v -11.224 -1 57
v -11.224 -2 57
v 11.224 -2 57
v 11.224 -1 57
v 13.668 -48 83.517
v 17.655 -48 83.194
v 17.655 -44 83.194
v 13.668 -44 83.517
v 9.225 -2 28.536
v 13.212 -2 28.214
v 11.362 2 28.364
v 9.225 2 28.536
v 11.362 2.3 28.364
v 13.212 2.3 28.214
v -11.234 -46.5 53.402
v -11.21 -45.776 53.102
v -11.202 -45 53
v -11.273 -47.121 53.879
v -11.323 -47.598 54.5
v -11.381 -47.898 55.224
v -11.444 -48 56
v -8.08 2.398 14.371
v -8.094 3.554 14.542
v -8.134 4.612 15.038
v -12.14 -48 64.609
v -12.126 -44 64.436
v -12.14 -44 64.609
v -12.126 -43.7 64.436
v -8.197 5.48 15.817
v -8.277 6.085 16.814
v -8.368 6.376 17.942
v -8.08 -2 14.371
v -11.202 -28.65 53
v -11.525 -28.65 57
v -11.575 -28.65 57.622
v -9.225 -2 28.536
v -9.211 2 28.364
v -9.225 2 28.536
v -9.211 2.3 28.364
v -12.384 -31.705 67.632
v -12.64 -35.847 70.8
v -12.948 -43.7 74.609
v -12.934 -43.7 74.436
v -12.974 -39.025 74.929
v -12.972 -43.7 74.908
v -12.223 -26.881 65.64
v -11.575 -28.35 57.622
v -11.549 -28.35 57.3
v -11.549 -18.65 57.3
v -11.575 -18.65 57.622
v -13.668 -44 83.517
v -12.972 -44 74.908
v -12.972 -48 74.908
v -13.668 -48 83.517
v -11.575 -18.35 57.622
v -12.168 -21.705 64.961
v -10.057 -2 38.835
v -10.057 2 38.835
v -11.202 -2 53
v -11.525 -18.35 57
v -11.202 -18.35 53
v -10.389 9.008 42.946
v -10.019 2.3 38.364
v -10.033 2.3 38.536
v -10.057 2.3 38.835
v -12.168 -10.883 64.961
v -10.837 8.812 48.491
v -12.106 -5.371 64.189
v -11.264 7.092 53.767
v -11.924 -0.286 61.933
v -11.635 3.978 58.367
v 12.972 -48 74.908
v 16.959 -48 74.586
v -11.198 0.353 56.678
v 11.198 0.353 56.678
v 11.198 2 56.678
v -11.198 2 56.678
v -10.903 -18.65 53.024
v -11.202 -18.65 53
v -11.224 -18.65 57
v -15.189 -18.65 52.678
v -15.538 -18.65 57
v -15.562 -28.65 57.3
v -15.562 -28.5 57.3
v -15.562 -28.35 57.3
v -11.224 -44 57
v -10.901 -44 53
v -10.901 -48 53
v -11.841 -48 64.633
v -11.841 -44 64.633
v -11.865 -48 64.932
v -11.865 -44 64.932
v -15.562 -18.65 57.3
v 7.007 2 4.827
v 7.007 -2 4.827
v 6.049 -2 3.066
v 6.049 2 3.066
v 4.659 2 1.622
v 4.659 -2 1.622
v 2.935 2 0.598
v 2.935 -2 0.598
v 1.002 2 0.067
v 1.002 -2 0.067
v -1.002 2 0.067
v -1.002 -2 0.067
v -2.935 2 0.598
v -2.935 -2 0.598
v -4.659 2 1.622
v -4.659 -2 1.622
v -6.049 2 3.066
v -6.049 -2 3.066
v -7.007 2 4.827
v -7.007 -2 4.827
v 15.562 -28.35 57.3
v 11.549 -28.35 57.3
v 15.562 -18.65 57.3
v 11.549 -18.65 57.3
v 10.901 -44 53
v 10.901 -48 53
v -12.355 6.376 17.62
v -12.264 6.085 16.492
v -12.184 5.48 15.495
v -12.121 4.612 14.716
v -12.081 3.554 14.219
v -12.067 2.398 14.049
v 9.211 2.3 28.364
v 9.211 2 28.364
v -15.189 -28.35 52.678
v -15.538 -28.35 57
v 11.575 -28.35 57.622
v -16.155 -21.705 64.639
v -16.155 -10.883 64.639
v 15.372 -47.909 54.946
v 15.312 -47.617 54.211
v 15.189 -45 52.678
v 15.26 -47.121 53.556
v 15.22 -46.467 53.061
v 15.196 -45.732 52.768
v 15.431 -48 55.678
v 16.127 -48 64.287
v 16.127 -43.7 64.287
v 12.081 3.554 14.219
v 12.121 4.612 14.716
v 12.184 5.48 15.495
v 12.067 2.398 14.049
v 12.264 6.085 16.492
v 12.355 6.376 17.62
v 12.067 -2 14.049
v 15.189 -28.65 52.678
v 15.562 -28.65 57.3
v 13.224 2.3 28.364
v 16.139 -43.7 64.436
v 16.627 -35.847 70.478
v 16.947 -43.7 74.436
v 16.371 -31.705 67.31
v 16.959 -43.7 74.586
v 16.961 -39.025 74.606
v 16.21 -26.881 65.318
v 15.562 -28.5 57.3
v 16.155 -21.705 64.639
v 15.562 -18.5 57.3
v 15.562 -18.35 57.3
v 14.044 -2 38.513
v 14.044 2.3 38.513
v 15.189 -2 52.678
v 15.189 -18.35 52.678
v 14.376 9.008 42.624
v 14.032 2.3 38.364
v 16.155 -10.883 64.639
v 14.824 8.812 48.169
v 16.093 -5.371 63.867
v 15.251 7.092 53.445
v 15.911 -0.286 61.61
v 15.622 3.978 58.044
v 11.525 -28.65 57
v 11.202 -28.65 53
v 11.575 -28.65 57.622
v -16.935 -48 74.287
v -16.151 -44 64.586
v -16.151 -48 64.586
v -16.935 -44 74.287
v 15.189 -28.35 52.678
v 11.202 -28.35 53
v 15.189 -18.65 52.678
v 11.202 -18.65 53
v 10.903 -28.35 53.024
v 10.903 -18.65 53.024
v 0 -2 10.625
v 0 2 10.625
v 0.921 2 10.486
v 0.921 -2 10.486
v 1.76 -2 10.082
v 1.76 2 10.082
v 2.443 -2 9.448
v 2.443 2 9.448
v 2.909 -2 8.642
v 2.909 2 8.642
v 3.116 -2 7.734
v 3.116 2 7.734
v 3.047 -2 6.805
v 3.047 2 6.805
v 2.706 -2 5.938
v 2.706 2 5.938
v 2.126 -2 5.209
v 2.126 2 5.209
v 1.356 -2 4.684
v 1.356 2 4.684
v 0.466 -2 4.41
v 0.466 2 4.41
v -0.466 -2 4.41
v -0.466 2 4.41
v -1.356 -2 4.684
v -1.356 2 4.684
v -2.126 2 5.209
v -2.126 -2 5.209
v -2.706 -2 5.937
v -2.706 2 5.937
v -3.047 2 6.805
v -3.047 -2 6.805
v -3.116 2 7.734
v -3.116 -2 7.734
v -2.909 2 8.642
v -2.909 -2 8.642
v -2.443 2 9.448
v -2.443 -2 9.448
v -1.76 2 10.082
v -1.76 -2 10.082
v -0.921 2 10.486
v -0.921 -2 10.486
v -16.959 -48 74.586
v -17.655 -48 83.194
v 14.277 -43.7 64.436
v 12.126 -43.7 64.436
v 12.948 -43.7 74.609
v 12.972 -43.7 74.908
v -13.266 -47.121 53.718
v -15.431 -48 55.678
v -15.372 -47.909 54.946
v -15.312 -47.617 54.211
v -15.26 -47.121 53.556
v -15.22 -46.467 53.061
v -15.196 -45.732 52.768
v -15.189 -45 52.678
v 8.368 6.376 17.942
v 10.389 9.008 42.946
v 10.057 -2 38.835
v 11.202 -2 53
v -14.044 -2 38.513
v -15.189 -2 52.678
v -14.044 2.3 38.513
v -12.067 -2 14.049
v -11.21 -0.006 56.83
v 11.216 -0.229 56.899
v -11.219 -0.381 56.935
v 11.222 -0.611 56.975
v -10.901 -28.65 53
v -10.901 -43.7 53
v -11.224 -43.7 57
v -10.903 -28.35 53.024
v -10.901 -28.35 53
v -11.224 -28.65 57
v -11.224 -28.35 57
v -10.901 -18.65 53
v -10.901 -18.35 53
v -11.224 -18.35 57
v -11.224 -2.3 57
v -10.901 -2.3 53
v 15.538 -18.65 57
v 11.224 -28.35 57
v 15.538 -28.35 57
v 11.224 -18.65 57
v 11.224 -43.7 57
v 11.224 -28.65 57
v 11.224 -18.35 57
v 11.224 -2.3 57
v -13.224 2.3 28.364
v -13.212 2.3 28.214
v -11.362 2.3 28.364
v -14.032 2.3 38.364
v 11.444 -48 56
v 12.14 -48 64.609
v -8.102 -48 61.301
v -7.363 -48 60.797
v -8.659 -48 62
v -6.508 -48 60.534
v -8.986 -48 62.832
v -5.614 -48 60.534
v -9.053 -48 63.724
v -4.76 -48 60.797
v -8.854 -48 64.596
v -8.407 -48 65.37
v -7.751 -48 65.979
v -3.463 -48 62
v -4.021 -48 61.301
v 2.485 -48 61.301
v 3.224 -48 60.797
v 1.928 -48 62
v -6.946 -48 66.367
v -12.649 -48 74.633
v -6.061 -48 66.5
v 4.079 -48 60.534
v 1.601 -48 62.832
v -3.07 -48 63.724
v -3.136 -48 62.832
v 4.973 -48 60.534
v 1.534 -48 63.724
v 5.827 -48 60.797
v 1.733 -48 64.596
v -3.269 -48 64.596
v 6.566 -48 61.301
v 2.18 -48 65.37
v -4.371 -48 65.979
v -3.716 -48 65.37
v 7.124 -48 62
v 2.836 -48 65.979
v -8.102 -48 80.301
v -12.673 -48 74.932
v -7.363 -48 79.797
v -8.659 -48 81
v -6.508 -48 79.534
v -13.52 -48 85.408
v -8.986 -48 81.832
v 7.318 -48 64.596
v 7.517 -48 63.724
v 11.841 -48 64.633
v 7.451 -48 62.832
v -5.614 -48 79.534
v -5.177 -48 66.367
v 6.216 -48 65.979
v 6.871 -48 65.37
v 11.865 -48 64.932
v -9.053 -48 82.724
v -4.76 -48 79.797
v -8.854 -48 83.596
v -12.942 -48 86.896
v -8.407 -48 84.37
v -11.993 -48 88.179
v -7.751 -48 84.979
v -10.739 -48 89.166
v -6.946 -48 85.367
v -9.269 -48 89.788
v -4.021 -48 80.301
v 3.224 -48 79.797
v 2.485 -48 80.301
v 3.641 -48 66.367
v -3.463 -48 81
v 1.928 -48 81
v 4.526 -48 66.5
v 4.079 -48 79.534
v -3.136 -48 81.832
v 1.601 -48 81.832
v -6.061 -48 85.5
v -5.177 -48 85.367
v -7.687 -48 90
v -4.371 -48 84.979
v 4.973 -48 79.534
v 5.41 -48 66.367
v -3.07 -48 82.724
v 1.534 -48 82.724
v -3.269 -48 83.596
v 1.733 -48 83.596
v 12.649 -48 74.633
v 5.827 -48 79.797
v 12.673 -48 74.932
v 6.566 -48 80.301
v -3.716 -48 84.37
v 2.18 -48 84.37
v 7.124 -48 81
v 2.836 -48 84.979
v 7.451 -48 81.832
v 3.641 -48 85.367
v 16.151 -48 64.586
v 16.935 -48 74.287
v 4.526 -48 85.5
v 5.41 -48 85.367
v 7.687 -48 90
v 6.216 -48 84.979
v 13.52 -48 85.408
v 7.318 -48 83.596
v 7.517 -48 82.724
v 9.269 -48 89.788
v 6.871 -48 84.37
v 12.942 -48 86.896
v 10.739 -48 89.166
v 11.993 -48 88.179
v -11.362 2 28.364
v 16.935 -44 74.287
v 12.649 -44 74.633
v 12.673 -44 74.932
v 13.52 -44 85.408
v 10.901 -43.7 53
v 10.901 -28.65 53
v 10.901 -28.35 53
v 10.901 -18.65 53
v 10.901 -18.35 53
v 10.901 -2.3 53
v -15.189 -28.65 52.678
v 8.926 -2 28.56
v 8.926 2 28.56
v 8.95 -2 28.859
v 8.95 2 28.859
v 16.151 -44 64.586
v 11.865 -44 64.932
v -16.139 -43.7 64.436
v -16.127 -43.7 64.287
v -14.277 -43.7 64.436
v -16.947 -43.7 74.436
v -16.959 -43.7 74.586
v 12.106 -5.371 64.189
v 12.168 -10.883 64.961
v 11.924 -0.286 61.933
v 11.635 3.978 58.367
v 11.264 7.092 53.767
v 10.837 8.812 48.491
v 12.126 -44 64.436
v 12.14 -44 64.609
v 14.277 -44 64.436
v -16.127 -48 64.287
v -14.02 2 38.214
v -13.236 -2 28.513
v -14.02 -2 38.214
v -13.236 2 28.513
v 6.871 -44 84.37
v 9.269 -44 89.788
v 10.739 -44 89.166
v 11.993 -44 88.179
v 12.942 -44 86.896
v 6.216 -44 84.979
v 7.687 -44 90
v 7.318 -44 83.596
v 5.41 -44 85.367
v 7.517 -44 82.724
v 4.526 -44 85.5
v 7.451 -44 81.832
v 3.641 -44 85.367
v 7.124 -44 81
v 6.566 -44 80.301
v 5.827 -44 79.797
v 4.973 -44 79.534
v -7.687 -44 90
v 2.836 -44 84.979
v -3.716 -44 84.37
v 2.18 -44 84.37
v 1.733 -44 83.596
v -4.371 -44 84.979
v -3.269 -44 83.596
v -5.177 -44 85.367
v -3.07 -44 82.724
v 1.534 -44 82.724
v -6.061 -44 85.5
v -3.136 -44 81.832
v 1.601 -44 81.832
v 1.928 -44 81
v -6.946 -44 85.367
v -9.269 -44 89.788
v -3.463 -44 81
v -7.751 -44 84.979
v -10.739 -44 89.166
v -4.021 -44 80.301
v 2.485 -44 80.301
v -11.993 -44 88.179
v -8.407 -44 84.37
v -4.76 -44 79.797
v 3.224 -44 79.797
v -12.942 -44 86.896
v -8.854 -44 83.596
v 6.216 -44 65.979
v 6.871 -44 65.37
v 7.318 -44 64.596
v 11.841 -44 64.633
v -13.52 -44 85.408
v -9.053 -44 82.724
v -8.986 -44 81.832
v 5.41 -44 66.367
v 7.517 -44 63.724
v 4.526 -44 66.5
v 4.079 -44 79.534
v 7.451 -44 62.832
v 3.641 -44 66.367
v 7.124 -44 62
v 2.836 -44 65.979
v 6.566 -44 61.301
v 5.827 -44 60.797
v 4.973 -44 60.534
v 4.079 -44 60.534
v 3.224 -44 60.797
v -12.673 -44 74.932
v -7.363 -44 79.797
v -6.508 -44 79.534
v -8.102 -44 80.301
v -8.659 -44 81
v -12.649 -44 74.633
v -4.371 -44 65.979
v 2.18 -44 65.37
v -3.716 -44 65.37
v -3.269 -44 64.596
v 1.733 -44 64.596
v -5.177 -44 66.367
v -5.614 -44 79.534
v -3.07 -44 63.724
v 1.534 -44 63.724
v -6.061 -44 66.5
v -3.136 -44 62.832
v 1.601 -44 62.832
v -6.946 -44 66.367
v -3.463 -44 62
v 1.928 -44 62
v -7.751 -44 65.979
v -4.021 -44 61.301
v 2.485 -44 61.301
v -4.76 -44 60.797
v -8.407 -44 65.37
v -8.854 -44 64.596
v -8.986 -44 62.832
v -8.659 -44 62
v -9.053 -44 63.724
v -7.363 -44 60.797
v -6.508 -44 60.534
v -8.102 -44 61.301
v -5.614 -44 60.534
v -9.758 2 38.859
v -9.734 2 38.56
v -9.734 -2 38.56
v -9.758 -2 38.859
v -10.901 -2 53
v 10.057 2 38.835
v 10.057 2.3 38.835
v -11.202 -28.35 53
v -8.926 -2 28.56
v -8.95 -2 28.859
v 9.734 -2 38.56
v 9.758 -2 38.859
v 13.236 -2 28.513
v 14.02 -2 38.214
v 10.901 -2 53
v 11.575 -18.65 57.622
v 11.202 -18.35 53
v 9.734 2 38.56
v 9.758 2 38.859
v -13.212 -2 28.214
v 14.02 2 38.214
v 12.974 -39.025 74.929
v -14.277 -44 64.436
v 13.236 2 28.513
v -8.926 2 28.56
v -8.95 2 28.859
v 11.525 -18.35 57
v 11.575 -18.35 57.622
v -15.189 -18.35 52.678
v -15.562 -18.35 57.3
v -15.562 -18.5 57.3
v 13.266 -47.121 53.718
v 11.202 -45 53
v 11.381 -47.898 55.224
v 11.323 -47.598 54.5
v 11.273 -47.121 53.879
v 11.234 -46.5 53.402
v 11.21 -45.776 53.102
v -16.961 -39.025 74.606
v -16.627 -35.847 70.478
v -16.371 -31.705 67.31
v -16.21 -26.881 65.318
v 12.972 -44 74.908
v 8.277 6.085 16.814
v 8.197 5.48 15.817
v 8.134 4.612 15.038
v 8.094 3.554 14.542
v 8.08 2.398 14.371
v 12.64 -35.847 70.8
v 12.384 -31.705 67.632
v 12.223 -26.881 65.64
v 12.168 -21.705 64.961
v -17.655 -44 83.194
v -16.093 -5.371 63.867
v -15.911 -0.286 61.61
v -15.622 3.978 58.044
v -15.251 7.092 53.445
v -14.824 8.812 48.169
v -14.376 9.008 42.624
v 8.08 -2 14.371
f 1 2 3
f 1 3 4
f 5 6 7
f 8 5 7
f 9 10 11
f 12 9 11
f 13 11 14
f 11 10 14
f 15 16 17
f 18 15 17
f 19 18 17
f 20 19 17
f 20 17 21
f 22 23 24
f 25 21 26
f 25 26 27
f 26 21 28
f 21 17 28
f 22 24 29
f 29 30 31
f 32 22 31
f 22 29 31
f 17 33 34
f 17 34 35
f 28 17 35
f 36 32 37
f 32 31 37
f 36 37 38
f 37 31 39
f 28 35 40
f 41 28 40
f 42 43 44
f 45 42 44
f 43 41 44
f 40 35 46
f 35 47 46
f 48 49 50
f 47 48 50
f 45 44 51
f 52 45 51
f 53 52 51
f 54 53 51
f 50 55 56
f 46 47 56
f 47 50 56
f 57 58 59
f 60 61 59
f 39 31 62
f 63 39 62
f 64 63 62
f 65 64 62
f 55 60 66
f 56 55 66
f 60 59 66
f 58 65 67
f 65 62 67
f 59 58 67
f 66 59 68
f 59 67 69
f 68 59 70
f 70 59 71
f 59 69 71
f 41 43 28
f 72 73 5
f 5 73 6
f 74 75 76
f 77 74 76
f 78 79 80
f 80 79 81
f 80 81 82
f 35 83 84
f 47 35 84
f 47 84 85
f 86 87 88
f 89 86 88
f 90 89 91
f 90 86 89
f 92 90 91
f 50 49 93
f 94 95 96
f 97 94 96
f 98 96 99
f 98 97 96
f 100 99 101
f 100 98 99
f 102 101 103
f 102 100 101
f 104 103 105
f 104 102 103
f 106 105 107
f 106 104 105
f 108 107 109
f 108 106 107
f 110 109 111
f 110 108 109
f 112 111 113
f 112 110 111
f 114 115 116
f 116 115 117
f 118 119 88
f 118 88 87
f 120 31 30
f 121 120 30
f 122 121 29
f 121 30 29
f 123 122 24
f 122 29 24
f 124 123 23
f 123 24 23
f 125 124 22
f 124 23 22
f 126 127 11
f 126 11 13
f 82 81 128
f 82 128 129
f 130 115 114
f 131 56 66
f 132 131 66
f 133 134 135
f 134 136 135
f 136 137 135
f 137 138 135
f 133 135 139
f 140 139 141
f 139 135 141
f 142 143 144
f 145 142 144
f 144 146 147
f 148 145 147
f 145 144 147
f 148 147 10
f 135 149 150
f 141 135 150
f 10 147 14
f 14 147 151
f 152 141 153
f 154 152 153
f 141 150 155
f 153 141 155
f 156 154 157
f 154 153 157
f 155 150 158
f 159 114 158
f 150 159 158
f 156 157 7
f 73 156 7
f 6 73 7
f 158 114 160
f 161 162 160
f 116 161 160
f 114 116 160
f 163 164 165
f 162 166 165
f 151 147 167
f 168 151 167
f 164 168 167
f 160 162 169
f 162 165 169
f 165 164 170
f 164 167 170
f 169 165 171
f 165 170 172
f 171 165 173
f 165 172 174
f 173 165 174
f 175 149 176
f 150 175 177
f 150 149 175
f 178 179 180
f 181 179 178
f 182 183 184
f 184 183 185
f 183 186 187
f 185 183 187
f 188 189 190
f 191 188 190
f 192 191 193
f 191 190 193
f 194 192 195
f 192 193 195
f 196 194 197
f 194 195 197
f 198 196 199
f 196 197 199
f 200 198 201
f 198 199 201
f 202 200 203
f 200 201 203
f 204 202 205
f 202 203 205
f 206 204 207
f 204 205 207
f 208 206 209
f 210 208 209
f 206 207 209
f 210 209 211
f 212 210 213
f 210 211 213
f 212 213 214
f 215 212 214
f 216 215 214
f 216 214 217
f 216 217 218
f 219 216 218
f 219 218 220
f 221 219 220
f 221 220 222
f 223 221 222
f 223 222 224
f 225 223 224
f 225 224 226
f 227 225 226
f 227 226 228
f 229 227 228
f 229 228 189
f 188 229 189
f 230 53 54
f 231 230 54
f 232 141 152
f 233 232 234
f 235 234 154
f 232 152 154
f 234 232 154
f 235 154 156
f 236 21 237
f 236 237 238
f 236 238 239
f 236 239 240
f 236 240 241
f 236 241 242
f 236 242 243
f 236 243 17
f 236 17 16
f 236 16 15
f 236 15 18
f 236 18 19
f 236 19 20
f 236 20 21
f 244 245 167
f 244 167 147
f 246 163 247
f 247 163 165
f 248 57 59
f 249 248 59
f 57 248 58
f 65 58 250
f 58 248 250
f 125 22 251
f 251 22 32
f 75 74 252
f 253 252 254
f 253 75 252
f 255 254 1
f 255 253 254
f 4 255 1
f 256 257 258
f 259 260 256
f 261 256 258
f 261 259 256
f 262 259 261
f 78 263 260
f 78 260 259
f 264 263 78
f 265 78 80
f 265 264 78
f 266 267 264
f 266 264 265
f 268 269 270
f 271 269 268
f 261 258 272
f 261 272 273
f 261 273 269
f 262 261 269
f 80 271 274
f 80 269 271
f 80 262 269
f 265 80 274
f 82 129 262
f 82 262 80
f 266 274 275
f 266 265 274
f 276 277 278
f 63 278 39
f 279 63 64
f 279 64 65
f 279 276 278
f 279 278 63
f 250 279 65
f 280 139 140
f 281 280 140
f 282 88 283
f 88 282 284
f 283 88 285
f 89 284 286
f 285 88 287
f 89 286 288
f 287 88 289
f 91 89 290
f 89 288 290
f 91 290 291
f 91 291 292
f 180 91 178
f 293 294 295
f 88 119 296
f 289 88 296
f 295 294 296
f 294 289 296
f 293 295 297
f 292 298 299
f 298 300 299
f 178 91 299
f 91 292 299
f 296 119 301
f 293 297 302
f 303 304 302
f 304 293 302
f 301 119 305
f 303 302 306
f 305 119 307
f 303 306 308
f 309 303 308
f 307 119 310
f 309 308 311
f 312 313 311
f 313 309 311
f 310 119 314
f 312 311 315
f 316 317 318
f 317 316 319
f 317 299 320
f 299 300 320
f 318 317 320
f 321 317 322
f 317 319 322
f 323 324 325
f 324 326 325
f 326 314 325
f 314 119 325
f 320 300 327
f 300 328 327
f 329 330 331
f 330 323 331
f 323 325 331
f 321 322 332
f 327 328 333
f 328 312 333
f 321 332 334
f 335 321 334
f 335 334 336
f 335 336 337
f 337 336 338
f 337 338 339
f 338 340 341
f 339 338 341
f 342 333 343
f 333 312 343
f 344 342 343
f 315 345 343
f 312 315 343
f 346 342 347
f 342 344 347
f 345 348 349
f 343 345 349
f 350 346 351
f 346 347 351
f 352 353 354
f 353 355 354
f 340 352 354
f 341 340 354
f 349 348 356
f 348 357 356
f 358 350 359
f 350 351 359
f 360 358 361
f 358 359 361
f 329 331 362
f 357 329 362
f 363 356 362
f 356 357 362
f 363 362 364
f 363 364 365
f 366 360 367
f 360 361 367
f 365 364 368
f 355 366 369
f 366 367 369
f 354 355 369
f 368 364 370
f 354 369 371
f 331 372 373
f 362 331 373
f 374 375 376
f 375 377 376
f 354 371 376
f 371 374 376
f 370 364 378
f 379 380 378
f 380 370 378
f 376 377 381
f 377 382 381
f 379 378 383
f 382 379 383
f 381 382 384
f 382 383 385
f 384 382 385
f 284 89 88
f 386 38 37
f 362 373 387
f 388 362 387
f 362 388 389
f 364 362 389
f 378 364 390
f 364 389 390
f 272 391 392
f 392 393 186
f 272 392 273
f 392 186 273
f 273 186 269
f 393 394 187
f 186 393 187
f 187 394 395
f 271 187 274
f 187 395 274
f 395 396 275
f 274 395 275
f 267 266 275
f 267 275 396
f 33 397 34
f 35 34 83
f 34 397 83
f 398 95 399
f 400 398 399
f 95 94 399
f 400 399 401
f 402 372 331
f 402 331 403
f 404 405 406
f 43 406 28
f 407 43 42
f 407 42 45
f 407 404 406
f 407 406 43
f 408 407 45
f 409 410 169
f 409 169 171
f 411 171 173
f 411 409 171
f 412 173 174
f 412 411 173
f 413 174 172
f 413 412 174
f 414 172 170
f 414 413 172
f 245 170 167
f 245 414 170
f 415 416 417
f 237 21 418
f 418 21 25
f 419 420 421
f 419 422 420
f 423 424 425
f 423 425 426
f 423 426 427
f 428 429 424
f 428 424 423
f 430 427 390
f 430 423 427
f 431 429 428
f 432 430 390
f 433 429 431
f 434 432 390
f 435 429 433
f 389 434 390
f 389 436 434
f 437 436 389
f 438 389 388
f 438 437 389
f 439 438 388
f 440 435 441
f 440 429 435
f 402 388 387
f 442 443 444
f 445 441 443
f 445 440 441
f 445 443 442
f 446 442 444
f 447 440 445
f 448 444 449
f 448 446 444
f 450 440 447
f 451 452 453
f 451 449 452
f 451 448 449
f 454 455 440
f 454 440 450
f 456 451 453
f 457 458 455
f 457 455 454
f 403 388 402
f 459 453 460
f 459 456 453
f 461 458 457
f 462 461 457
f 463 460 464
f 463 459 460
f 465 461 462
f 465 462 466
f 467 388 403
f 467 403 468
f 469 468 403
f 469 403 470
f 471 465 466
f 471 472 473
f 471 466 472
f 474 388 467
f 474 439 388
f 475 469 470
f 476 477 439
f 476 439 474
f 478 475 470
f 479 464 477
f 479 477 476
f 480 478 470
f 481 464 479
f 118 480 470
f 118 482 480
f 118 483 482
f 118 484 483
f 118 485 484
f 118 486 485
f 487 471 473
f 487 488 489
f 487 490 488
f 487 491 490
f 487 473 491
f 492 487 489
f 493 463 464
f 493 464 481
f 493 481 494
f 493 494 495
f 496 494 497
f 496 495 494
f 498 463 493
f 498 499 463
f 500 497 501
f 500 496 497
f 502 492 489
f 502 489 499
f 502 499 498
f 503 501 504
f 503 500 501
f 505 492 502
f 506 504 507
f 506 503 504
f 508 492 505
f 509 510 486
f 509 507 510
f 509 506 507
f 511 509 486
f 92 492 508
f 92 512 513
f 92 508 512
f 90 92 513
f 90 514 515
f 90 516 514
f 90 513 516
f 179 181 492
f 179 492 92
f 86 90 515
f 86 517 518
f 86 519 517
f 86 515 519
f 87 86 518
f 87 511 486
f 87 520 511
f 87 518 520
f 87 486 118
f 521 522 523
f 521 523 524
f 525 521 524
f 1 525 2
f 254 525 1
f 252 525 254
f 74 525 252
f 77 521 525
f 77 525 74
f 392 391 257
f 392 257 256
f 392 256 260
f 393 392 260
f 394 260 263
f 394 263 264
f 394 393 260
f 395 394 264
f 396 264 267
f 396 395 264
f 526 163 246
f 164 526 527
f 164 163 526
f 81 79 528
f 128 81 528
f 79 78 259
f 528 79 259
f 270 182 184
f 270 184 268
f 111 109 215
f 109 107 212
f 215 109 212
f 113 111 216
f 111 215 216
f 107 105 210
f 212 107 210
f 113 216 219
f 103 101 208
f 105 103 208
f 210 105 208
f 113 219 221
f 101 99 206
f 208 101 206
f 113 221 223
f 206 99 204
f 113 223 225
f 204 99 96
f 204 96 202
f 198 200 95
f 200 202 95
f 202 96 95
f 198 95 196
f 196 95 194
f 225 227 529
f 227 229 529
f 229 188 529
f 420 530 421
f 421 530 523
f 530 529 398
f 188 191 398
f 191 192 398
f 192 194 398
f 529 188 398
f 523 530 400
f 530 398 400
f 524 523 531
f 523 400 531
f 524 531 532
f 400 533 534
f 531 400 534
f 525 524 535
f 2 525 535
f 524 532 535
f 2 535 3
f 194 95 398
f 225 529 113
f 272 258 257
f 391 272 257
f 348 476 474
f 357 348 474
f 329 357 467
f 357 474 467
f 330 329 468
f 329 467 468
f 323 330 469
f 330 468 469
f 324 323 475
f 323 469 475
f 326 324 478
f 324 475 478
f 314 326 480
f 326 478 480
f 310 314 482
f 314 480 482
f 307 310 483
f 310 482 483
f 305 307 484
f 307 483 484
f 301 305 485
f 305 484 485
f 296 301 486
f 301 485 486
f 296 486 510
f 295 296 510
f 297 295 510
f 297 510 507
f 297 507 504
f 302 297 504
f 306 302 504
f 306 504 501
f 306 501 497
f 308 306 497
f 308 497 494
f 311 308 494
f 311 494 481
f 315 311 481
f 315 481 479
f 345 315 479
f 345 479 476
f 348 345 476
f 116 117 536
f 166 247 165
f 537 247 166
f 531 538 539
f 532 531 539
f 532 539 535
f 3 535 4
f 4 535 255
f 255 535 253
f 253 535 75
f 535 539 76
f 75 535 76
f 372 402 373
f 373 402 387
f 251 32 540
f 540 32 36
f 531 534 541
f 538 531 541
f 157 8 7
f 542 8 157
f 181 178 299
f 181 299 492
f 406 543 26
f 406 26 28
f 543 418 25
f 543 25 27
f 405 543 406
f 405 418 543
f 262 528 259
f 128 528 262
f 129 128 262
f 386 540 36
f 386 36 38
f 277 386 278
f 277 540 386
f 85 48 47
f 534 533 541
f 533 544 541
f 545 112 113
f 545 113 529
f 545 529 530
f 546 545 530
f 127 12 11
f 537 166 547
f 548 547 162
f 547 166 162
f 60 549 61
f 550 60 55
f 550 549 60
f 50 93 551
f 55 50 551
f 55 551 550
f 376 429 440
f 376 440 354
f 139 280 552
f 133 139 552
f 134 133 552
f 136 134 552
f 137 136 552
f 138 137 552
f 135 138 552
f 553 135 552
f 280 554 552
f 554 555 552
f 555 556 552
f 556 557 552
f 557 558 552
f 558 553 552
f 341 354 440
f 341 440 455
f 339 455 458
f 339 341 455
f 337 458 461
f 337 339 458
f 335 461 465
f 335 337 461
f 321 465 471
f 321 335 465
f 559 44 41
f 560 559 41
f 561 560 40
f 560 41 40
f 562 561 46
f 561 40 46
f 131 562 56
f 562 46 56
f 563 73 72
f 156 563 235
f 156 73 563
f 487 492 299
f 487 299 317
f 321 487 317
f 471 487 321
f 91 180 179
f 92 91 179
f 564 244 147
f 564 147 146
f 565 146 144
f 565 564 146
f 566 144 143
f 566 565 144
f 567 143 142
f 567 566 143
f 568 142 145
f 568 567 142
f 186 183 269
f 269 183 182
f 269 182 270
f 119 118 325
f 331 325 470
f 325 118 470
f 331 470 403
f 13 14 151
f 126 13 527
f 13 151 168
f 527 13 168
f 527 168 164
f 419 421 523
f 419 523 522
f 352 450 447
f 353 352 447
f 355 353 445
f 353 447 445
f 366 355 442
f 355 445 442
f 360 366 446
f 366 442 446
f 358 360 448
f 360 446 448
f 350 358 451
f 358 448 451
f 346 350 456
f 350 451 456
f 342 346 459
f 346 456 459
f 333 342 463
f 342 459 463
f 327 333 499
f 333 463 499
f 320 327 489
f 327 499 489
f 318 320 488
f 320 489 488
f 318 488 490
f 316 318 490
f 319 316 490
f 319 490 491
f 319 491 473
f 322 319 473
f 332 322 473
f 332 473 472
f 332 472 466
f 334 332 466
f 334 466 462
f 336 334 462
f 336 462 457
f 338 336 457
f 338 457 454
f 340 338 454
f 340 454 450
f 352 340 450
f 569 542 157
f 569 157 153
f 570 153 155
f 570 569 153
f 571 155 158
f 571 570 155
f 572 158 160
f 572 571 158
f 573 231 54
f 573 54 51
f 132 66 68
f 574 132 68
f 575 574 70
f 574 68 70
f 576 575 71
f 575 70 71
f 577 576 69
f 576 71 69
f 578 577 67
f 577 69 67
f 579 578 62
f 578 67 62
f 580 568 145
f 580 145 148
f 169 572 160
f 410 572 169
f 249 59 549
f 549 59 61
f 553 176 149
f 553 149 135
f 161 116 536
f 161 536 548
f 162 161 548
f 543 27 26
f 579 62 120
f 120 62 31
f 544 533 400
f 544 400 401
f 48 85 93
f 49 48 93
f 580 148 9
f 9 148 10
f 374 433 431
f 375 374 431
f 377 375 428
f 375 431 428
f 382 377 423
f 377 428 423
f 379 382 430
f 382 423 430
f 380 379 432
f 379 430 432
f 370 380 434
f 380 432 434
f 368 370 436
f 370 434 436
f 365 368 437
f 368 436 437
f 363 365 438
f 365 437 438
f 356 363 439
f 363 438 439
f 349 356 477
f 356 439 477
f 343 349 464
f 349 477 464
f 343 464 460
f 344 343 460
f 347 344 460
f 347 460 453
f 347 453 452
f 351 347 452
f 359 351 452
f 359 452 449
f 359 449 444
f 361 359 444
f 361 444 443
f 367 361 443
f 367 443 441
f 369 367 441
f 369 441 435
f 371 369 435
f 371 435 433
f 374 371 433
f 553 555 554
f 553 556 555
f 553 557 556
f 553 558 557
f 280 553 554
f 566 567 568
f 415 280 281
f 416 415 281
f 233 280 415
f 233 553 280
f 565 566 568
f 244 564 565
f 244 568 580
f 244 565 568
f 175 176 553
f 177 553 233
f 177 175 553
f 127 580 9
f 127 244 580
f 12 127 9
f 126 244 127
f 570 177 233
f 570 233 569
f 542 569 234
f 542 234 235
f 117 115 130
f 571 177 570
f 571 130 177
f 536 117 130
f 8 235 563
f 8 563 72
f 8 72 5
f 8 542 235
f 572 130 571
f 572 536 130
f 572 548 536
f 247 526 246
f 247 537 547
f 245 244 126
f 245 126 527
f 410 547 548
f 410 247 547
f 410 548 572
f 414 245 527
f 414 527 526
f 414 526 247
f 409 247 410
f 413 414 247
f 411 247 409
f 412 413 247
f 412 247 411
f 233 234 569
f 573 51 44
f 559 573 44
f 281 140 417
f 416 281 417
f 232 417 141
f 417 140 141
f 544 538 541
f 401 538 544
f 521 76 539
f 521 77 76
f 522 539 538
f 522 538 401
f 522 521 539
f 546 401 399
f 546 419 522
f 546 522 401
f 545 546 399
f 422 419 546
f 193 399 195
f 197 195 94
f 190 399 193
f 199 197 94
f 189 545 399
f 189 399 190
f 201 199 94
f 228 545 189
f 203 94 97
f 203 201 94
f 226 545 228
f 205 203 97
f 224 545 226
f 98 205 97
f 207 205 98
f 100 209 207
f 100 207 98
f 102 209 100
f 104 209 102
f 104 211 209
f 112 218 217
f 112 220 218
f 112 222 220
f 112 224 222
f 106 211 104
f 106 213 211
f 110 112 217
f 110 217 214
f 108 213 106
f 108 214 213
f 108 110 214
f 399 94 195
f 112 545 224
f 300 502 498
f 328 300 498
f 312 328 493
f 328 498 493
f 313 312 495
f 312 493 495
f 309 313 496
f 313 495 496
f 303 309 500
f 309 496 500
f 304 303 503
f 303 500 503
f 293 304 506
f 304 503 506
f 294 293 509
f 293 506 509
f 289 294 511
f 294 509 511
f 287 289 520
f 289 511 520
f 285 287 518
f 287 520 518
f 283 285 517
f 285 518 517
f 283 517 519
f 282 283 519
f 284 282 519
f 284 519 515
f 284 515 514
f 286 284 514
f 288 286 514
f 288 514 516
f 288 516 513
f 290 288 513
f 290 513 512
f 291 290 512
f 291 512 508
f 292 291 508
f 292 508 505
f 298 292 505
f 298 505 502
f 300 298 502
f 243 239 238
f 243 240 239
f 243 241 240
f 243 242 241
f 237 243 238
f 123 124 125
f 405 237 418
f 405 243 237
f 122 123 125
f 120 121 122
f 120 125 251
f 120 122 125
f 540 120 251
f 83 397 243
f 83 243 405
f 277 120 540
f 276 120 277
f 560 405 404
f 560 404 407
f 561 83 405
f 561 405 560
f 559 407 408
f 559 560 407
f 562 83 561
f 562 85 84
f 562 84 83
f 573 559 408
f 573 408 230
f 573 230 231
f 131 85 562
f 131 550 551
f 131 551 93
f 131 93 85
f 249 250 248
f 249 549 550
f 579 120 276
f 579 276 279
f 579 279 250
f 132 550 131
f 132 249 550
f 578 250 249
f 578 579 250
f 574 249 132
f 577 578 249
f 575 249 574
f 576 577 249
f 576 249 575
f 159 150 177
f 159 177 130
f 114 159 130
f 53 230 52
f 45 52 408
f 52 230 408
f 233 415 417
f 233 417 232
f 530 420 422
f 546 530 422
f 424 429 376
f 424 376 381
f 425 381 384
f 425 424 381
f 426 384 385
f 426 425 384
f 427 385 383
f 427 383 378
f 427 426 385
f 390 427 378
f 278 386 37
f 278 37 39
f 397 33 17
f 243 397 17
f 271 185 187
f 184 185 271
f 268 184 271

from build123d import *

# Parameters (mm, degrees)
EXTRUDE_THIN1_DEPTH             = 15
SKETCH2_R                       = 3.125
SKETCH2_R_2                     = 3
CUT_EXTRUDE1_DEPTH              = 105.043260233
FILLET1_R                       = 6
BOSS_EXTRUDE1_DEPTH             = 4
CUT_EXTRUDE_THIN1_DEPTH         = 104.516638951
CUT_EXTRUDE_THIN1_DEPTH_BACK    = 104.516638951
SKETCH9_W                       = 10
SKETCH9_H                       = 0.3
SKETCH9_W_2                     = 0.3
SKETCH9_H_2                     = 10
SKETCH10_W                      = 0.3
SKETCH10_H                      = 6.641398284
SKETCH10_H_2                    = 6.68977618
SKETCH10_H_3                    = 6.232858904
SKETCH10_W_2                    = 7.476045761
SKETCH10_H_4                    = 0.3
SKETCH10_W_3                    = 11.836568253
SKETCH10_H_5                    = 6.233569927
CUT_EXTRUDE_THIN2_DEPTH         = 4.3
SKETCH11_R                      = 56.701195511
SKETCH11_W                      = 9.732603568
SKETCH11_H                      = 4
SKETCH11_W_2                    = 4.336308338
SKETCH11_H_2                    = 9.7
CUT_EXTRUDE2_DEPTH              = 0.3
BOSS_EXTRUDE2_REACH             = 105.517
SKETCH12_W                      = 4
SKETCH12_H                      = 4
BOSS_EXTRUDE2_DIRECTION_2_REACH = 105.517
CUT_EXTRUDE3_DEPTH              = 0.3
CUT_EXTRUDE4_DEPTH              = 0.3
CUT_EXTRUDE_THIN3_DEPTH         = 104.516638951
CUT_EXTRUDE_THIN3_DEPTH_BACK    = 104.516638951
SKETCH13_W                      = 26.058456106
SKETCH13_H                      = 0.3
SKETCH13_W_2                    = 36.049711327


with BuildPart() as part:
    # Sketch1 → Extrude-Thin1 (new, symmetric)
    with BuildSketch(Plane(origin=(0, 0, 0), x_dir=(0, 0, -1), z_dir=(1, 0, 0))):
        with BuildLine():
            Line((0, 2), (-54, 2))
            ThreePointArc((-54, 2), (-56.121320344, 1.121320344), (-57, -1))
            Line((-57, -1), (-57, -44))
            Line((-57, -44), (-90, -44))
            Line((-90, -44), (-90, -48))
            Line((-90, -48), (-56, -48))
            ThreePointArc((-56, -48), (-53.878679656, -47.121320344), (-53, -45))
            Line((-53, -45), (-53, -2))
            Line((-53, -2), (0, -2))
            Line((0, -2), (0, 2))
        make_face()
    extrude(amount=EXTRUDE_THIN1_DEPTH, both=True)

    # Sketch2 → Cut-Extrude1 (cut, through all)
    with BuildSketch(Plane(origin=(0, 2, 0), x_dir=(1, 0, 0), z_dir=(0, 1, 0))):
        with Locations(Location((0, -7.5, 0), (0, 0, 270))):
            Circle(SKETCH2_R)
        with Locations(Location((-6.061254587, -82.5, 0), (0, 0, 270))):
            Circle(SKETCH2_R_2)
        with Locations(Location((-6.061254587, -63.5, 0), (0, 0, 270))):
            Circle(SKETCH2_R_2)
        with Locations(Location((4.525736758, -82.5, 0), (0, 0, 270))):
            Circle(SKETCH2_R_2)
        with Locations(Location((4.525736758, -63.5, 0), (0, 0, 270))):
            Circle(SKETCH2_R_2)
        with BuildLine():
            Line((-7.475626789, -6.895844304), (-15, -100))
            Line((-15, -100), (-17.60021431, 8.448336275))
            Line((-17.60021431, 8.448336275), (38.426582869, 9.42947631))
            Line((38.426582869, 9.42947631), (15, -100))
            Line((15, -100), (7.475626789, -6.895844304))
            ThreePointArc((7.475626789, -6.895844304), (0, 0), (-7.475626789, -6.895844304))
        make_face()
    extrude(amount=-CUT_EXTRUDE1_DEPTH, mode=Mode.SUBTRACT)

    # Fillet1
    fillet1_edges = [part.edges().sort_by_distance(p)[0] for p in [
        (-14.191832722, -46, 90),
        (14.191832722, -46, 90),
    ]]
    fillet(fillet1_edges, radius=FILLET1_R)

    # Sketch8 → Boss-Extrude1 (add)
    with BuildSketch(Plane(origin=(6.873434456, 0, -0.555488482), x_dir=(-0.08055409274536145, 0, -0.9967502385963958), z_dir=(0.9967502385963958, 0, -0.08055409274536145))):
        with BuildLine():
            Line((-56.739879552, -48), (-84.346269175, -48))
            Line((-84.346269175, -48), (-84.346269175, -44))
            Line((-84.346269175, -44), (-75.730098482, -39.025451531))
            ThreePointArc((-75.730098482, -39.025451531), (-68.409590406, -31.704943455), (-65.730098482, -21.704943455))
            Line((-65.730098482, -21.704943455), (-65.730098482, -10.883213246))
            ThreePointArc((-65.730098482, -10.883213246), (-59.11411389, 3.978419624), (-43.643285327, 9.007619086))
            Line((-43.643285327, 9.007619086), (-18.558264158, 6.375866362))
            ThreePointArc((-18.558264158, 6.375866362), (-16.003300216, 5.074502978), (-14.975626789, 2.397699896))
            Line((-14.975626789, 2.397699896), (-14.975626789, 2))
            Line((-14.975626789, 2), (-14.975626789, -2))
            Line((-14.975626789, -2), (-53.730098482, -2))
            Line((-53.730098482, -2), (-53.730098482, -45))
            add(Edge.make_bspline(
                [(-56.739879552, -48), (-53.730098482, -48), (-53.730098482, -45)],
                knots=[4.71238898, 4.71238898, 4.71238898, 6.283185307, 6.283185307, 6.283185307], degree=2, weights=[1, 0.707106781, 1]))
        make_face()
    boss_extrude1 = extrude(amount=BOSS_EXTRUDE1_DEPTH)

    # Mirror1: Boss-Extrude1 across plane
    add(boss_extrude1.mirror(Plane(origin=(0, 0, 0), x_dir=(0, 0, 1), z_dir=(1, 0, 0))))

    # Sketch9 → Cut-Extrude-Thin1 (cut, two sides: drawn at the far end of the back side and taken through both)
    with BuildSketch(Plane(origin=(0, 0, 0), x_dir=(0, 0, -1), z_dir=(1, 0, 0)).offset(-CUT_EXTRUDE_THIN1_DEPTH_BACK)):
        with Locations((-33.363519176, 2.15)):
            Rectangle(SKETCH9_W, SKETCH9_H)
        with Locations((-57.15, -23.5)):
            Rectangle(SKETCH9_W_2, SKETCH9_H_2)
        with Locations((-69.436121351, -43.85)):
            Rectangle(SKETCH9_W, SKETCH9_H)
    extrude(amount=CUT_EXTRUDE_THIN1_DEPTH + CUT_EXTRUDE_THIN1_DEPTH_BACK, mode=Mode.SUBTRACT)

    # Sketch10 → Cut-Extrude-Thin2 (cut)
    with BuildSketch(Plane(origin=(-10.86043541, 0, -0.877704853), x_dir=(-0.08055409274536145, 0, 0.9967502385963957), z_dir=(-0.9967502385963957, 0, -0.08055409274536145))):
        with Locations((29.336560852, -1.020699142)):
            Rectangle(SKETCH10_W, SKETCH10_H)
        with Locations((39.36916442, -1.04488809)):
            Rectangle(SKETCH10_W, SKETCH10_H_2)
        with Locations((65.52677258, -46.816429452)):
            Rectangle(SKETCH10_W, SKETCH10_H_3)
        with Locations((54.629362047, -18.5)):
            Rectangle(SKETCH10_W_2, SKETCH10_H_4)
        with Locations((52.449100801, -28.5)):
            Rectangle(SKETCH10_W_3, SKETCH10_H_4)
        with Locations((75.559376148, -46.816784963)):
            Rectangle(SKETCH10_W, SKETCH10_H_5)
    cut_extrude_thin2 = extrude(amount=-CUT_EXTRUDE_THIN2_DEPTH, mode=Mode.SUBTRACT)

    # Sketch11 → Cut-Extrude2 (cut)
    with BuildSketch(Plane(origin=(-6.574409384, 0, -0.531322254), x_dir=(-0.08055409274536145, 0, 0.9967502385963957), z_dir=(-0.9967502385963957, 0, -0.08055409274536145))):
        with Locations((49.164522952, -12.48660382)):
            Circle(SKETCH11_R)
        with Locations((34.352862636, 0)):
            Rectangle(SKETCH11_W, SKETCH11_H, mode=Mode.SUBTRACT)
        with Locations((55.898252651, -23.5)):
            Rectangle(SKETCH11_W_2, SKETCH11_H_2, mode=Mode.SUBTRACT)
        with Locations((70.543074364, -46)):
            Rectangle(SKETCH11_W, SKETCH11_H, mode=Mode.SUBTRACT)
    cut_extrude2 = extrude(amount=CUT_EXTRUDE2_DEPTH, mode=Mode.SUBTRACT)

    # Mirror2: Cut-Extrude-Thin2 across plane
    add(cut_extrude_thin2.mirror(Plane(origin=(0, 0, 0), x_dir=(0, 0, 1), z_dir=(1, 0, 0))), mode=Mode.SUBTRACT)

    # Mirror3: Cut-Extrude2 across plane
    add(cut_extrude2.mirror(Plane(origin=(0, 0, 0), x_dir=(0, 0, 1), z_dir=(1, 0, 0))), mode=Mode.SUBTRACT)

    # Boss-Extrude2: up to this plane
    boss_extrude2_end = Plane(origin=(-6.574409384, 0, -0.531322254), z_dir=(0.9967502385963957, 0, 0.08055409274536145))
    # Sketch12 → Boss-Extrude2 (add, up to the surface)
    with BuildSketch(Plane(origin=(0, 0, 0), x_dir=(0, 0, -1), z_dir=(1, 0, 0)), mode=Mode.PRIVATE) as boss_extrude2_sk1:
        with Locations((-54.677783629, 0)):
            Rectangle(SKETCH12_W, SKETCH12_H)
    boss_extrude2_tool1 = split(extrude(boss_extrude2_sk1.sketch, amount=-BOSS_EXTRUDE2_REACH, mode=Mode.PRIVATE), bisect_by=boss_extrude2_end, keep=Keep.BOTH, mode=Mode.PRIVATE)
    add(boss_extrude2_tool1.solids().sort_by_distance((0, 0, 54.677784))[0])
    # Sketch12 → Boss-Extrude2 (add, up to the surface)
    with BuildSketch(Plane(origin=(0, 0, 0), x_dir=(0, 0, -1), z_dir=(1, 0, 0)), mode=Mode.PRIVATE) as boss_extrude2_sk2:
        with Locations((-55, -46)):
            Rectangle(SKETCH12_W, SKETCH12_H)
    boss_extrude2_tool2 = split(extrude(boss_extrude2_sk2.sketch, amount=-BOSS_EXTRUDE2_REACH, mode=Mode.PRIVATE), bisect_by=boss_extrude2_end, keep=Keep.BOTH, mode=Mode.PRIVATE)
    add(boss_extrude2_tool2.solids().sort_by_distance((0, -46, 55))[0])

    # Boss-Extrude2 direction 2: up to this plane
    boss_extrude2_direction_2_end = Plane(origin=(6.574409384, 0, -0.531322254), z_dir=(-0.9967502385963957, 0, 0.08055409274536145))
    # Sketch12 → Boss-Extrude2 direction 2 (add, up to the surface)
    with BuildSketch(Plane(origin=(0, 0, 0), x_dir=(0, 0, -1), z_dir=(1, 0, 0)), mode=Mode.PRIVATE) as boss_extrude2_direction_2_sk1:
        with Locations((-54.677783629, 0)):
            Rectangle(SKETCH12_W, SKETCH12_H)
    boss_extrude2_direction_2_tool1 = split(extrude(boss_extrude2_direction_2_sk1.sketch, amount=BOSS_EXTRUDE2_DIRECTION_2_REACH, mode=Mode.PRIVATE), bisect_by=boss_extrude2_direction_2_end, keep=Keep.BOTH, mode=Mode.PRIVATE)
    add(boss_extrude2_direction_2_tool1.solids().sort_by_distance((0, 0, 54.677784))[0])
    # Sketch12 → Boss-Extrude2 direction 2 (add, up to the surface)
    with BuildSketch(Plane(origin=(0, 0, 0), x_dir=(0, 0, -1), z_dir=(1, 0, 0)), mode=Mode.PRIVATE) as boss_extrude2_direction_2_sk2:
        with Locations((-55, -46)):
            Rectangle(SKETCH12_W, SKETCH12_H)
    boss_extrude2_direction_2_tool2 = split(extrude(boss_extrude2_direction_2_sk2.sketch, amount=BOSS_EXTRUDE2_DIRECTION_2_REACH, mode=Mode.PRIVATE), bisect_by=boss_extrude2_direction_2_end, keep=Keep.BOTH, mode=Mode.PRIVATE)
    add(boss_extrude2_direction_2_tool2.solids().sort_by_distance((0, -46, 55))[0])

    # Sketch14 → Cut-Extrude3 (cut)
    with BuildSketch(Plane(origin=(0, -44, 0), x_dir=(1, 0, 0), z_dir=(0, 1, 0))):
        Polygon((-6.486159071, -72.877526277), (-16.895928913, -72.553711619), (-16.959135518, -74.585633887), (-6.549365677, -74.909448545), align=None)
        Polygon((6.549365677, -74.909448545), (16.959135518, -74.585633887), (16.895928913, -72.553711619), (6.486159071, -72.877526277), align=None)
    extrude(amount=CUT_EXTRUDE3_DEPTH, mode=Mode.SUBTRACT)

    # Sketch15 → Cut-Extrude4 (cut)
    with BuildSketch(Plane(origin=(0, 2, 0), x_dir=(1, 0, 0), z_dir=(0, 1, 0))):
        Polygon((14.263002683, -38.29994084), (-15.974696203, -38.054570408), (0.914390447, -39.969172337), align=None)
    extrude(amount=CUT_EXTRUDE4_DEPTH, mode=Mode.SUBTRACT)


with BuildPart() as cut_extrude4_piece_1:
    # of the separate pieces the step leaves, piece 1, a body of its own (cut_extrude4_pieces)
    add(part.part.solids().sort_by_distance((-7.687370214, -48, 90))[0])

    # Sketch13 → Cut-Extrude-Thin3 (cut, two sides: drawn at the far end of the back side and taken through both)
    with BuildSketch(Plane(origin=(0, 0, 0), x_dir=(0, 0, -1), z_dir=(1, 0, 0)).offset(-CUT_EXTRUDE_THIN3_DEPTH_BACK)):
        with Locations((-62.775931951, -43.85)):
            Rectangle(SKETCH13_W, SKETCH13_H)
        with Locations((-61.935402371, -2.15)):
            Rectangle(SKETCH13_W_2, SKETCH13_H)
    extrude(amount=CUT_EXTRUDE_THIN3_DEPTH + CUT_EXTRUDE_THIN3_DEPTH_BACK, mode=Mode.SUBTRACT)


with BuildPart() as cut_extrude4_piece_2:
    # of the separate pieces the step leaves, piece 2, a body of its own (cut_extrude4_pieces)
    add(part.part.solids().sort_by_distance((-11.201613792, -28.65, 53))[0])


with BuildPart() as cut_extrude4_piece_3:
    # of the separate pieces the step leaves, piece 3, a body of its own (cut_extrude4_pieces)
    add(part.part.solids().sort_by_distance((14.043865846, 2.3, 38.513031712))[0])


with BuildPart() as cut_extrude_thin3_piece_1:
    # of the separate pieces the step leaves, piece 1, a body of its own (cut_extrude_thin3_pieces)
    add(cut_extrude4_piece_1.part.solids().sort_by_distance((-9.733673592, -2, 38.560389239))[0])


with BuildPart() as cut_extrude_thin3_piece_2:
    # of the separate pieces the step leaves, piece 2, a body of its own (cut_extrude_thin3_pieces)
    add(cut_extrude4_piece_1.part.solids().sort_by_distance((-10.900635685, -43.7, 53))[0])


with BuildPart() as cut_extrude_thin3_piece_3:
    # of the separate pieces the step leaves, piece 3, a body of its own (cut_extrude_thin3_pieces)
    add(cut_extrude4_piece_1.part.solids().sort_by_distance((-7.687370214, -48, 90))[0])


solid = Compound([cut_extrude4_piece_2.part, cut_extrude4_piece_3.part, cut_extrude_thin3_piece_1.part, cut_extrude_thin3_piece_2.part, cut_extrude_thin3_piece_3.part])
